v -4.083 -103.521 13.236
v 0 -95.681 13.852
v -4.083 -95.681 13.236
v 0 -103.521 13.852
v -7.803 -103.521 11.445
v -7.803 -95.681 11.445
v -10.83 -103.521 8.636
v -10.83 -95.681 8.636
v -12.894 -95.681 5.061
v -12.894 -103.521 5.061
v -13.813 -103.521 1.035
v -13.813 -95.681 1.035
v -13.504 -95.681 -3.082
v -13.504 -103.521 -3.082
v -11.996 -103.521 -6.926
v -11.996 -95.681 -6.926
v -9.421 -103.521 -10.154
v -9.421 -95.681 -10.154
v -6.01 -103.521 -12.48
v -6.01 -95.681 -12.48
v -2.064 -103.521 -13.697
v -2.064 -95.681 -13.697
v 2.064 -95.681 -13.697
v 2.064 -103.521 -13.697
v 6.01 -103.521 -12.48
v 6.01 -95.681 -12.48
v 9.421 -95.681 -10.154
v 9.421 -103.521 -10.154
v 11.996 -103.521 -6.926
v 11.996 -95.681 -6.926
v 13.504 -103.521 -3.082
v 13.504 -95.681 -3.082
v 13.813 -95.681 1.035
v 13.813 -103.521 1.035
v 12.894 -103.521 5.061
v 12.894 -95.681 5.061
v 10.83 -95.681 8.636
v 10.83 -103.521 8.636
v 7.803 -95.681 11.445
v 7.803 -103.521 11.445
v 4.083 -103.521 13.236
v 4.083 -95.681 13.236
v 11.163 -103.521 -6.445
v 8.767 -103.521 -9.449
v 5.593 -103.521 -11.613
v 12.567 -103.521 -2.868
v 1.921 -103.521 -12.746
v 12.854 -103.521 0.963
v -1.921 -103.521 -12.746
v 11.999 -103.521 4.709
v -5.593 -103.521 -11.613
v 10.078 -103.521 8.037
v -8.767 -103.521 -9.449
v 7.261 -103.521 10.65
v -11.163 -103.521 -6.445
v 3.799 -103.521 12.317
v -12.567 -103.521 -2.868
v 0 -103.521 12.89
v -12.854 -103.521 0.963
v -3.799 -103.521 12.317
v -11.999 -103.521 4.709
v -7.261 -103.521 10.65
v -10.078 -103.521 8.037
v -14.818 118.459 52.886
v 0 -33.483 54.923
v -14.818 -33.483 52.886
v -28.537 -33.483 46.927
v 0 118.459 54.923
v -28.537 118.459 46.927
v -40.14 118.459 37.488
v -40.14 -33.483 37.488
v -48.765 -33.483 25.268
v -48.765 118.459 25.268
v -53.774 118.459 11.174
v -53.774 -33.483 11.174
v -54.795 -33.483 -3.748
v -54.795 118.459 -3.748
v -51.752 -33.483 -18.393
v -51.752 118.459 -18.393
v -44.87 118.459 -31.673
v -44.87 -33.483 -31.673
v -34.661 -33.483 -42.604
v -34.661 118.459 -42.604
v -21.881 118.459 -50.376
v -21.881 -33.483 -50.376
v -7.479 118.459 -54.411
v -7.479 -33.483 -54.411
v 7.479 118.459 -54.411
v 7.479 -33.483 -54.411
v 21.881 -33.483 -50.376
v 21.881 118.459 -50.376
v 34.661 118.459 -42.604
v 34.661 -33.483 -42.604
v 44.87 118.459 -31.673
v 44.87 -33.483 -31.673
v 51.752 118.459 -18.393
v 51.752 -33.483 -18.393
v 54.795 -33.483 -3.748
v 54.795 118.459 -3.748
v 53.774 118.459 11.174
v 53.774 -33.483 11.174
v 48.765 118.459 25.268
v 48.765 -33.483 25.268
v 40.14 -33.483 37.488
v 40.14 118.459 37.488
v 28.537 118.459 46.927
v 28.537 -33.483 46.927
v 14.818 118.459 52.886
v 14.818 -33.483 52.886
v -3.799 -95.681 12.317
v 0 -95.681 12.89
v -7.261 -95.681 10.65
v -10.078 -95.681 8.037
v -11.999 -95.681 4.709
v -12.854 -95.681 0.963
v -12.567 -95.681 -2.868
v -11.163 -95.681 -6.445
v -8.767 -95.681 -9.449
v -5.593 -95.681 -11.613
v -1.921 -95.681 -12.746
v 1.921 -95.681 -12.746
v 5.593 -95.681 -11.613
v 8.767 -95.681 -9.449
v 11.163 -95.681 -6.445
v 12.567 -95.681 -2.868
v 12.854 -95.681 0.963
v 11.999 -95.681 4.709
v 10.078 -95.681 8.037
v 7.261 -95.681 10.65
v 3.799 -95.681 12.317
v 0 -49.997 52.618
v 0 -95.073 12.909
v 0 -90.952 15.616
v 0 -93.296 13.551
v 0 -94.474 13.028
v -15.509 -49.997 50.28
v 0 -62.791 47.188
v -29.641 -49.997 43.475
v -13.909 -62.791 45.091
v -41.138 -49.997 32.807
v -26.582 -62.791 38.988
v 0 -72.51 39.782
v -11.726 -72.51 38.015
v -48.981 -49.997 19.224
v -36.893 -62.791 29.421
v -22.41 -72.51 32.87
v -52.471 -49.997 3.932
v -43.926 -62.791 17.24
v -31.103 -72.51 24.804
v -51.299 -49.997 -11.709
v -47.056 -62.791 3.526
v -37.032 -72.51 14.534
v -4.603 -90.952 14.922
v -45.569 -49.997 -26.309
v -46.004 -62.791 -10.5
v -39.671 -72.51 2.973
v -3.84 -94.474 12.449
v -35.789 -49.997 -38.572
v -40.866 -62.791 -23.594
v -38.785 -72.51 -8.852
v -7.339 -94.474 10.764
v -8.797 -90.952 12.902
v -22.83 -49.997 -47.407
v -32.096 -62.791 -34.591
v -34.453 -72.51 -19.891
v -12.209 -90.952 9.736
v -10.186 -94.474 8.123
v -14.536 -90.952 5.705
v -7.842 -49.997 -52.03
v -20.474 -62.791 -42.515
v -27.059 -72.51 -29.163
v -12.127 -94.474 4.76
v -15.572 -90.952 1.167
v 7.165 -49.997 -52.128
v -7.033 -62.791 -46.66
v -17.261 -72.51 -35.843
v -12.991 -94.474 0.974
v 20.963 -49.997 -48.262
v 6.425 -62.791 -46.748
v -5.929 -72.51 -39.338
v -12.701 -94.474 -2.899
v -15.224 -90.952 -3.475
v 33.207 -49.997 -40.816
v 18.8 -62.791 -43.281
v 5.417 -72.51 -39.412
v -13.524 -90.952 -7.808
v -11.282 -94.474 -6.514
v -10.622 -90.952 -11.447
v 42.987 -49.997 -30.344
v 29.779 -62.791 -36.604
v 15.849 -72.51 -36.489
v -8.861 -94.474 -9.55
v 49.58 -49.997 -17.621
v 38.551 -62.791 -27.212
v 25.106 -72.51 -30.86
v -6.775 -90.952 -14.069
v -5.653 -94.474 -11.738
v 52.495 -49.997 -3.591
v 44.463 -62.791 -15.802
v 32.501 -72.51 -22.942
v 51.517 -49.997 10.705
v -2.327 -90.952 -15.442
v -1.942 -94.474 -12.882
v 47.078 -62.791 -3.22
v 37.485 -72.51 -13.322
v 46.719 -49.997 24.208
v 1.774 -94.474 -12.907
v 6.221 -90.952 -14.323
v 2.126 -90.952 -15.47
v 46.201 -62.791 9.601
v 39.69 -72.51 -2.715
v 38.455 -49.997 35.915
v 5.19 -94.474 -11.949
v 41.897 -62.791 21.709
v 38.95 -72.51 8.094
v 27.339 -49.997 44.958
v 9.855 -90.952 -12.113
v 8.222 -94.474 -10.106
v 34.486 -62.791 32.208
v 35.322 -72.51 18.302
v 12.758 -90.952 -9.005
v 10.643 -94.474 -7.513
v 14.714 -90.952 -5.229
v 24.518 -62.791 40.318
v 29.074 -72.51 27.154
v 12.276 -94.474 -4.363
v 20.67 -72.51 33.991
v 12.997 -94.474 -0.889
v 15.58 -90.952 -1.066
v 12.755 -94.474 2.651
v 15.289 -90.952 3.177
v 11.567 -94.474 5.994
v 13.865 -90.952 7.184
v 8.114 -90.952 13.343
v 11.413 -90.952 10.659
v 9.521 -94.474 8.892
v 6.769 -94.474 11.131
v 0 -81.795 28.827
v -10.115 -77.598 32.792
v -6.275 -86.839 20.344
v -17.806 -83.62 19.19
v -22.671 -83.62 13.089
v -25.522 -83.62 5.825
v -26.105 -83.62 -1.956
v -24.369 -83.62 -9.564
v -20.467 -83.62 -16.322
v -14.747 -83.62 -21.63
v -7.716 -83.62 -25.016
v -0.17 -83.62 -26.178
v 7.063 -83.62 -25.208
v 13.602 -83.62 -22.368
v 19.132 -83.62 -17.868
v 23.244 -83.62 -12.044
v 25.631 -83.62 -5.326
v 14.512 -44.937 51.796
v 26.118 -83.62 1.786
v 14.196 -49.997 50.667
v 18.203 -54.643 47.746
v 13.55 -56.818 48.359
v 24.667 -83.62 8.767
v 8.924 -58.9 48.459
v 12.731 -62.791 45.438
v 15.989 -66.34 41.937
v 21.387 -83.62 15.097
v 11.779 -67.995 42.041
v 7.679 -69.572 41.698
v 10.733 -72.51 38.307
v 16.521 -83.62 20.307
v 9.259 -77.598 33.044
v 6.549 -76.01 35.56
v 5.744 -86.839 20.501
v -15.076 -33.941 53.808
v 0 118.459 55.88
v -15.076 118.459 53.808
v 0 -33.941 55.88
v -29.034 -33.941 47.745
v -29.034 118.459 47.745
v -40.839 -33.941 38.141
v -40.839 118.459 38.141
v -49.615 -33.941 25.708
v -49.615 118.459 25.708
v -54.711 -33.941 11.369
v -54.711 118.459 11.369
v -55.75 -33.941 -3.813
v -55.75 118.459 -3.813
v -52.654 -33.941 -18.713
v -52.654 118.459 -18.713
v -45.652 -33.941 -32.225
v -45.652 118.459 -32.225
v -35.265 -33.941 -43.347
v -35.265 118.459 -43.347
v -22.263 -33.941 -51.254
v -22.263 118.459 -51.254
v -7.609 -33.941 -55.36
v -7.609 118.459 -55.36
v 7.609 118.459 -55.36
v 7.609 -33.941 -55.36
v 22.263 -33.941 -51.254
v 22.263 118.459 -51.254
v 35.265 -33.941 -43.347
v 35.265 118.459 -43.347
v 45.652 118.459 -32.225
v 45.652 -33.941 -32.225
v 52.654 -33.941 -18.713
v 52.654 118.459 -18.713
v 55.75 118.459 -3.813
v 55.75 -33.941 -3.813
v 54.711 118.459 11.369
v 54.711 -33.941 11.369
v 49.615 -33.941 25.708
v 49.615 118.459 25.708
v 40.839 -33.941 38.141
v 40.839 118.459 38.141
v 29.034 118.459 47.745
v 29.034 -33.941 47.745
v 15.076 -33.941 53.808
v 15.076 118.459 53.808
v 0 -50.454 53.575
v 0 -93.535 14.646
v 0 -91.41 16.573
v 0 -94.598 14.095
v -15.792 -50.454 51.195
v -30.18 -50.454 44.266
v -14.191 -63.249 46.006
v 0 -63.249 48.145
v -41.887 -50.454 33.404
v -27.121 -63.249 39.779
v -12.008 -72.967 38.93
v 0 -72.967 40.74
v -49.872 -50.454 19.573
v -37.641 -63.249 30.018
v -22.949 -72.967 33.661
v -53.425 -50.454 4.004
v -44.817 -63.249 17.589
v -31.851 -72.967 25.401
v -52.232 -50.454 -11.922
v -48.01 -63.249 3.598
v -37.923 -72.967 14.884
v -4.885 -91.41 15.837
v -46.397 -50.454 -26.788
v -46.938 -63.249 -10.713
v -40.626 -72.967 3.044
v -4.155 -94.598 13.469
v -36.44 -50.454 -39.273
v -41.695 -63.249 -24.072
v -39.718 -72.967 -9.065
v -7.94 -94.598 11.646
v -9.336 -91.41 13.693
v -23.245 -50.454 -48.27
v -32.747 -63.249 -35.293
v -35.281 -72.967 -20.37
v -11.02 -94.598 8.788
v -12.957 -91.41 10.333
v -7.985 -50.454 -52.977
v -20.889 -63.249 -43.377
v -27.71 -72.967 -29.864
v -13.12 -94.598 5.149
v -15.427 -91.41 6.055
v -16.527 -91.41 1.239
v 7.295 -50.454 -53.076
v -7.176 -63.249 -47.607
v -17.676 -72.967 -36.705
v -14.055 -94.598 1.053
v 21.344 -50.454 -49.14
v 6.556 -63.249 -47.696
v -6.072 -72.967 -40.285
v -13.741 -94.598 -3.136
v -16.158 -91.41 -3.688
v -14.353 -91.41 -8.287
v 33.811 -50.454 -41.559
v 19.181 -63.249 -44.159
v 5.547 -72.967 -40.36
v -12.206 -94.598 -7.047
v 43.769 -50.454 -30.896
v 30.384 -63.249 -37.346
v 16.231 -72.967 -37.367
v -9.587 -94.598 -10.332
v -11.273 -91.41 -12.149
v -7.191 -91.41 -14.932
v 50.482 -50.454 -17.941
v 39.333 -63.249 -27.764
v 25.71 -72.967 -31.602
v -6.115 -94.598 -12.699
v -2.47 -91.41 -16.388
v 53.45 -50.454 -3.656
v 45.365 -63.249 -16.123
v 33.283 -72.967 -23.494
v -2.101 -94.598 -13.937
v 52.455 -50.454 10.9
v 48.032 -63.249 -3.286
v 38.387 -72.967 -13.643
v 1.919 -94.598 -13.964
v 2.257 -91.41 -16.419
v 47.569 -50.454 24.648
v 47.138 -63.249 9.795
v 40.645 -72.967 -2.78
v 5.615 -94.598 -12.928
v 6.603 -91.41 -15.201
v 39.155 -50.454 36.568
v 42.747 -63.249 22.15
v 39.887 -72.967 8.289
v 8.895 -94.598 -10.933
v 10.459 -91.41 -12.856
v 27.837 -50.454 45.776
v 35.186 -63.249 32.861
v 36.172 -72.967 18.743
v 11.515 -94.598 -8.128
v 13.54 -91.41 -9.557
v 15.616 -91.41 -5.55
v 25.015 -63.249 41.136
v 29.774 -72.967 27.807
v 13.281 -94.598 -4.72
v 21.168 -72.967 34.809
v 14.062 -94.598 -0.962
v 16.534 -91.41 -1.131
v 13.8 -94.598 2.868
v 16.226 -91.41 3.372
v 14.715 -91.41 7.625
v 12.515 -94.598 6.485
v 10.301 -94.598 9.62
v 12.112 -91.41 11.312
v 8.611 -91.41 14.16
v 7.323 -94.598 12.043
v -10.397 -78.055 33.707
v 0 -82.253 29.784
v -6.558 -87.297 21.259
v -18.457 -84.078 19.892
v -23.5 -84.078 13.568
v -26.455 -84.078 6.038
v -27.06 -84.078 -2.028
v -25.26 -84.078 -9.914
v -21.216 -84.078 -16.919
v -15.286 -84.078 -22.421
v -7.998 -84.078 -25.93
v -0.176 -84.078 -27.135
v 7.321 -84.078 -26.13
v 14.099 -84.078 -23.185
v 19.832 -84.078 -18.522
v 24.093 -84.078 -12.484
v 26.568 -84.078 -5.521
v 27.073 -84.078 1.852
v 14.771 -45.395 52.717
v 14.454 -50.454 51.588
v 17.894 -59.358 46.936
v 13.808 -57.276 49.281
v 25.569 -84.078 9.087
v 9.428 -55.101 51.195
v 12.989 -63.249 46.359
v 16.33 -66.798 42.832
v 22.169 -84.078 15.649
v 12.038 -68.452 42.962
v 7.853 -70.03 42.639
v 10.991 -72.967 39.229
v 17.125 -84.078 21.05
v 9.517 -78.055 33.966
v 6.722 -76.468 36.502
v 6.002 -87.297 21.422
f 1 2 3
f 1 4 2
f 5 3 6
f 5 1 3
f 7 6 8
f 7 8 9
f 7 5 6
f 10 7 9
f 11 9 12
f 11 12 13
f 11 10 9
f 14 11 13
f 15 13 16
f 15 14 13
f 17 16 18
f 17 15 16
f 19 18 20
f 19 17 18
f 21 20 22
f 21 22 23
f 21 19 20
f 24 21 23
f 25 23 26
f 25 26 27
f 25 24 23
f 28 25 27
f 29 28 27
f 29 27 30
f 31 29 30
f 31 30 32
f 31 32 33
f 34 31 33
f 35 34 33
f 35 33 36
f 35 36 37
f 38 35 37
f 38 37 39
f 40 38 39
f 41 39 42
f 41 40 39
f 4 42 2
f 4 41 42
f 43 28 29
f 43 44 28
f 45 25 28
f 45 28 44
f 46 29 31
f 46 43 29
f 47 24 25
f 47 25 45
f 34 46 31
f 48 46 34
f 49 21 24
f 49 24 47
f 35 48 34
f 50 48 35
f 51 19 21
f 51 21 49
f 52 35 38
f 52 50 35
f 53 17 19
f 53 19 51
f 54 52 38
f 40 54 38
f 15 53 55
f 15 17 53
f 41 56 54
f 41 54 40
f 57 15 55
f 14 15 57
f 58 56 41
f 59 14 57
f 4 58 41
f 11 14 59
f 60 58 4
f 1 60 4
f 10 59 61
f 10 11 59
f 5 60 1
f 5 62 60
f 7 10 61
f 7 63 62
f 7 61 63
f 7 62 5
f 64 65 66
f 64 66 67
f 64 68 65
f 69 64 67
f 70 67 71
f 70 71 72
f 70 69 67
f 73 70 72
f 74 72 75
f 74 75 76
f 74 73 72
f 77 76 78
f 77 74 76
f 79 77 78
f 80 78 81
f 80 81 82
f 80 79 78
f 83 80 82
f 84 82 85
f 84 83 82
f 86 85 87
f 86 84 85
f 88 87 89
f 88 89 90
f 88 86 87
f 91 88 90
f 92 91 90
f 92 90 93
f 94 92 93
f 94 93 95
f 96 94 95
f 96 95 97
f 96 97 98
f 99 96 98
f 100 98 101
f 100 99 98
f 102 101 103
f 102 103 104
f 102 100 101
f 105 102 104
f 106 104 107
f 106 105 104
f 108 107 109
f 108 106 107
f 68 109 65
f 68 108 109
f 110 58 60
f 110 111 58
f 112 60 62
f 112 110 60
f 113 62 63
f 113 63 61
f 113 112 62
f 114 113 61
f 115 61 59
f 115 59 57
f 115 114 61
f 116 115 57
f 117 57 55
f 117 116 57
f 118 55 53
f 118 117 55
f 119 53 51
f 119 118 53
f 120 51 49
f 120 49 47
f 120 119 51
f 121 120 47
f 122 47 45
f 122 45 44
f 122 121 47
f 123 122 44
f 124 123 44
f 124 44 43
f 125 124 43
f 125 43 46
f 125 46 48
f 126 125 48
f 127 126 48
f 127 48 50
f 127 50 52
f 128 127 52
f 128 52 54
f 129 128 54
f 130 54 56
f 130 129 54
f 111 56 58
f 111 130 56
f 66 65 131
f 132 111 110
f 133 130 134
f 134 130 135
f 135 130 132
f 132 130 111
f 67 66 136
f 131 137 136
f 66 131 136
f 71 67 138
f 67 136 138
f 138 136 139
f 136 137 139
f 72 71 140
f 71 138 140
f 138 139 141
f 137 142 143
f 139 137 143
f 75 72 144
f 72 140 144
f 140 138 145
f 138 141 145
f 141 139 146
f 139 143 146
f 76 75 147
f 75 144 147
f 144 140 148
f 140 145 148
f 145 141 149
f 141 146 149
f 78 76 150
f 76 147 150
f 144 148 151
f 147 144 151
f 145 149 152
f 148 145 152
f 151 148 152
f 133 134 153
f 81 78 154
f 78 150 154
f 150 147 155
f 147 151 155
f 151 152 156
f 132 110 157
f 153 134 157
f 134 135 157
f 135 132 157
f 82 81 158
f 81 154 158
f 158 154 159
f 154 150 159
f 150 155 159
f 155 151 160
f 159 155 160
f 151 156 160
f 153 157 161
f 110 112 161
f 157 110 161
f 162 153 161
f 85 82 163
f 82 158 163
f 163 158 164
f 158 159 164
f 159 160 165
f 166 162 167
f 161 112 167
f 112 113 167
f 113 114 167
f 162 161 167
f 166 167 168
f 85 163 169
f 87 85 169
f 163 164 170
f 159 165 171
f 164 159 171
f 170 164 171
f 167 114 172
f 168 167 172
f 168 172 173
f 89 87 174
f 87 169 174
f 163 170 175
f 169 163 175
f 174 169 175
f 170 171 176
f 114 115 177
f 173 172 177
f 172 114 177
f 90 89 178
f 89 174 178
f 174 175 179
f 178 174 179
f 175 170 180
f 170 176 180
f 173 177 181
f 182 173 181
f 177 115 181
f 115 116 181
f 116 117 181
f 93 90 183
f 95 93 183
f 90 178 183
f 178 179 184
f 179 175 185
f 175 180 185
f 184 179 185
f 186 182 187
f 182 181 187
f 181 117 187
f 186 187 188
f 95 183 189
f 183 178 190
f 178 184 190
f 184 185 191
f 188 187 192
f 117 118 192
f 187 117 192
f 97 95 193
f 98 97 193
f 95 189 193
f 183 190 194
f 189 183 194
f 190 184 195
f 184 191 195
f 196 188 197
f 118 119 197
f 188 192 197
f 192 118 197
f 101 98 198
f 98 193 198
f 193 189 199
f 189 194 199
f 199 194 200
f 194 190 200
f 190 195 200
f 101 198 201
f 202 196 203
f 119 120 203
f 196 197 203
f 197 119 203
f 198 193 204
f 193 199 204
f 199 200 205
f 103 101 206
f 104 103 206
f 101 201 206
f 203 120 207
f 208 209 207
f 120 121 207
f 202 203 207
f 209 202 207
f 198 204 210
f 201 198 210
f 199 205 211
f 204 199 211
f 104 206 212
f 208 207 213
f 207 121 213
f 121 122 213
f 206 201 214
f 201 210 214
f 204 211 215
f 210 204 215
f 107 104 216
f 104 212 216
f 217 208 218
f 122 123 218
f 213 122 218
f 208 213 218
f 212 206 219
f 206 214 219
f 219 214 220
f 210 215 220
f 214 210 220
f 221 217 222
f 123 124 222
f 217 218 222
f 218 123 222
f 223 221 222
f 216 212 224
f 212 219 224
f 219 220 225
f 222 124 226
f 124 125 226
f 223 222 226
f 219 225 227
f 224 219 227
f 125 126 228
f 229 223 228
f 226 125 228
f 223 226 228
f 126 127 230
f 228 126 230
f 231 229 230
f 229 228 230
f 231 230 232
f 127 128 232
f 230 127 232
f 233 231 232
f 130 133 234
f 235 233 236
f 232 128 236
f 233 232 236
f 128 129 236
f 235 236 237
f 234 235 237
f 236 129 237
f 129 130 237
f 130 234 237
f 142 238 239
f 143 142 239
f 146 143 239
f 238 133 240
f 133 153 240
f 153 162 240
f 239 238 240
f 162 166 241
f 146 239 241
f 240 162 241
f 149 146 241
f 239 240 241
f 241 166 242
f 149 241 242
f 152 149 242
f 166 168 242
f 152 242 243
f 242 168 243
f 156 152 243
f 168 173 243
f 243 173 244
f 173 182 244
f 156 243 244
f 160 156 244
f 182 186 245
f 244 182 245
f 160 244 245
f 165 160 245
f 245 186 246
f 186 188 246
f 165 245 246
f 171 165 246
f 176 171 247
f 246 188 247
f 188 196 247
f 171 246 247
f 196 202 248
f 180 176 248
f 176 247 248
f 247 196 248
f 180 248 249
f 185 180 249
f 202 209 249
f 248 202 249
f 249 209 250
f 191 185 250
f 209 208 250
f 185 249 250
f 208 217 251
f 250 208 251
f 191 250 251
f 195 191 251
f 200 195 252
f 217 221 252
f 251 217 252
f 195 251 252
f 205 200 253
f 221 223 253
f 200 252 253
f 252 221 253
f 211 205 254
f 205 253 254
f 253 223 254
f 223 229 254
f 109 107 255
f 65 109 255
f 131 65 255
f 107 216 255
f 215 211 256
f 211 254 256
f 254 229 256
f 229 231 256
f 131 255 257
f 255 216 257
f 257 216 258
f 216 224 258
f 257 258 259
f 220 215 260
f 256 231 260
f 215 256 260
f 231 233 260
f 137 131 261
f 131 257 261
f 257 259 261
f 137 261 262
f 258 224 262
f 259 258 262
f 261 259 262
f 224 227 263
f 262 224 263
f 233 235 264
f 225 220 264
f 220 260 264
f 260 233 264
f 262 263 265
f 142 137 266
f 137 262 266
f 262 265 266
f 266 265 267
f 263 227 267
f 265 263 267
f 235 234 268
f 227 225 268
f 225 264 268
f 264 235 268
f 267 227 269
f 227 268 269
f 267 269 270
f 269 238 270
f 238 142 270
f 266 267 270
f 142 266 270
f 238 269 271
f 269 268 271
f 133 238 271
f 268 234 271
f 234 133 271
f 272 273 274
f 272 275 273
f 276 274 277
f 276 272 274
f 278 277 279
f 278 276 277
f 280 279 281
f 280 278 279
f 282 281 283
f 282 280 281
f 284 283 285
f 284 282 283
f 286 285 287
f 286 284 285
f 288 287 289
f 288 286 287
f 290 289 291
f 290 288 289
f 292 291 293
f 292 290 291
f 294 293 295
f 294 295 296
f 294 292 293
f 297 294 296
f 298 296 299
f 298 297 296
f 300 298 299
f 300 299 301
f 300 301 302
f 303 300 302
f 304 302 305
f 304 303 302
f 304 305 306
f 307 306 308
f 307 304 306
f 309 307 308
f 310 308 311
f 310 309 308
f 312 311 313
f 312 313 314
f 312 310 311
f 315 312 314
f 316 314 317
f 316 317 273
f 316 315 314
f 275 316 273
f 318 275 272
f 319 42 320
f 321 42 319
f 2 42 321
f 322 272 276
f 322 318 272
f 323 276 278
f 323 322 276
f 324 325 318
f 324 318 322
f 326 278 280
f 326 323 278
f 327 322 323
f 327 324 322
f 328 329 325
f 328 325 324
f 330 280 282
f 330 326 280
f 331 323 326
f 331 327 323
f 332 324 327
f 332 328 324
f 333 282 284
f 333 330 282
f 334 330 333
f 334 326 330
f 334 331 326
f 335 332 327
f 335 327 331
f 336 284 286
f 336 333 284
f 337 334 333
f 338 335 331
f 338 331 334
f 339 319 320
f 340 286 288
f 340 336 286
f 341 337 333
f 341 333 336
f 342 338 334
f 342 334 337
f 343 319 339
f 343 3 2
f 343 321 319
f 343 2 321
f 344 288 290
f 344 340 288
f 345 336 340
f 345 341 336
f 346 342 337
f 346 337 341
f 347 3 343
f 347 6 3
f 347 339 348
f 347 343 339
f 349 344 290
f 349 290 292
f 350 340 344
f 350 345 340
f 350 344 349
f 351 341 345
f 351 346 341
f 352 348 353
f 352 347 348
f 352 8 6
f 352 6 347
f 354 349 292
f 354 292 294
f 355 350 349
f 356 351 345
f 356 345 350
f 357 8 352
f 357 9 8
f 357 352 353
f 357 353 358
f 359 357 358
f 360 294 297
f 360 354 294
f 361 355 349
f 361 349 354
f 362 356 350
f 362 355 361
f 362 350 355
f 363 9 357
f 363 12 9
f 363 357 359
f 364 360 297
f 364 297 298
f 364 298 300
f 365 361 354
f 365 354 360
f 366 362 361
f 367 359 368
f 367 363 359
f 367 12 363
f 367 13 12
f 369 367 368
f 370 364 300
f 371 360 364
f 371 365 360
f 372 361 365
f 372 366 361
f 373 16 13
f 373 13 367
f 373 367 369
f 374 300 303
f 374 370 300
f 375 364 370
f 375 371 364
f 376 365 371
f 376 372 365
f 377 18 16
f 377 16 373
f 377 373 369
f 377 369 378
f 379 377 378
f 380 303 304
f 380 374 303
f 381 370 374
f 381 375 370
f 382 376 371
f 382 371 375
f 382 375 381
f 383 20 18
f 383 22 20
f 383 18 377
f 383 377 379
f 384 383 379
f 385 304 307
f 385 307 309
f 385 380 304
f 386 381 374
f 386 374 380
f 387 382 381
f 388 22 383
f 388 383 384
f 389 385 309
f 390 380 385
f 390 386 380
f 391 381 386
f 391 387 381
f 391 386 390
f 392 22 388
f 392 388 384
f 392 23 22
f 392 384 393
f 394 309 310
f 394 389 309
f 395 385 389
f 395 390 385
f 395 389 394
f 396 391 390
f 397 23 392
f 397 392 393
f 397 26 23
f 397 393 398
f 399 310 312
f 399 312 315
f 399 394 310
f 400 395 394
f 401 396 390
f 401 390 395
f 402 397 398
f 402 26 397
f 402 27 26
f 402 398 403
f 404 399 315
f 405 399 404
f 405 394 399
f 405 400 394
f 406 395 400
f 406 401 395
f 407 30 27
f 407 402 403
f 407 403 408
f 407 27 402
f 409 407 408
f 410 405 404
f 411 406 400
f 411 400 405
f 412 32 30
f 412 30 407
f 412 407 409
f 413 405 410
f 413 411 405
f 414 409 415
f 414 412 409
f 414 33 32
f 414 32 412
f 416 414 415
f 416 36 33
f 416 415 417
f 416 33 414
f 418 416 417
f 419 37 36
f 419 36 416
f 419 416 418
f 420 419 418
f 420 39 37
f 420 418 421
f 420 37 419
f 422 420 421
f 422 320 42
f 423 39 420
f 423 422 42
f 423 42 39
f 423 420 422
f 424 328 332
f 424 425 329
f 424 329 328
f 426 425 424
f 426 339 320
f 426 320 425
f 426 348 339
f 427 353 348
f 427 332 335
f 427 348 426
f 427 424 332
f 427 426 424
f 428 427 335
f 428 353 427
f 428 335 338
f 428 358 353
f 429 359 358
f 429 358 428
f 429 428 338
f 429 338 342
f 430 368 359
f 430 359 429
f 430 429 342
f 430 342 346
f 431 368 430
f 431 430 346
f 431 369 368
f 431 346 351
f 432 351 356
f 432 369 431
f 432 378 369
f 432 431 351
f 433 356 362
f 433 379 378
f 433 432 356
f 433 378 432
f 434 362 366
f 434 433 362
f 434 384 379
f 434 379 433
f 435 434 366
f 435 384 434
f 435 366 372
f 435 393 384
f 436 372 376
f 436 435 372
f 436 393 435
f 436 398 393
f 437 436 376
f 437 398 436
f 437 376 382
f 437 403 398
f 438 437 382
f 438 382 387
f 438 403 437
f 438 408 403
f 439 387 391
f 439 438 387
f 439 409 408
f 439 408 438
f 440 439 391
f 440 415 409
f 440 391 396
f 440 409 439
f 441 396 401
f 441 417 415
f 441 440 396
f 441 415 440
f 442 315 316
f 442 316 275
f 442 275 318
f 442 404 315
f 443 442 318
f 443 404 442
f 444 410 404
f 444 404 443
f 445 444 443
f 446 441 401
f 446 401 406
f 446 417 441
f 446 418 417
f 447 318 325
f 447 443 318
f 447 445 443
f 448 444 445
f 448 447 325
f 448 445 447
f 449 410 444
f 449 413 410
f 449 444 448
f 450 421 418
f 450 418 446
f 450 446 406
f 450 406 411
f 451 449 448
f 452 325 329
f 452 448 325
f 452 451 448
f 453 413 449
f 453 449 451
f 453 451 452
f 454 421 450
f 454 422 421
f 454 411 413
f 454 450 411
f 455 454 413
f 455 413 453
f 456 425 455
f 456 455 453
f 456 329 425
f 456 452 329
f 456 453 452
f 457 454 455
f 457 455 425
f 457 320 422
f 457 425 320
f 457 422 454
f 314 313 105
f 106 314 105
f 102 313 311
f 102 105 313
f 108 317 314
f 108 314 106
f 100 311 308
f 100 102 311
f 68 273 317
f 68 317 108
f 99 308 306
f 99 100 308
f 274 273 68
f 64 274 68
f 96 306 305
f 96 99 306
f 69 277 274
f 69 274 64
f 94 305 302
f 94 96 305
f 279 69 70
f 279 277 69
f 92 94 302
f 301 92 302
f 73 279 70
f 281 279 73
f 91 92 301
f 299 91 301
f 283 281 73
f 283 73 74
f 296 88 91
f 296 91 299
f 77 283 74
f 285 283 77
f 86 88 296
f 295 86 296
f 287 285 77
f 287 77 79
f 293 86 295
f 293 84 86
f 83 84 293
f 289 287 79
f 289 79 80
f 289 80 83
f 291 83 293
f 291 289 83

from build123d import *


with BuildPart() as part:
    # Sketch1 → Revolve2 (revolve)
    with BuildSketch(Plane.XY, mode=Mode.PRIVATE) as revolve2_sk:
        with BuildLine():
            Line((-55.88, 118.459427374), (-55.88, -33.940572626))
            add(Edge.make_bspline(
                [(-55.88, -33.940572626), (-54.990575769, -80.080925815), (-14.574030728, -85.897657427), (-13.851510687, -95.680738649)],
                knots=[0, 0, 0, 0, 0.984737572, 0.984737572, 0.984737572, 0.984737572], degree=3))
            Line((-13.851510687, -95.680738649), (-13.851510687, -103.52108655))
            Line((-13.851510687, -103.52108655), (-12.889681114, -103.52108655))
            Line((-12.889681114, -103.52108655), (-12.889681114, -95.680738649))
            add(Edge.make_bspline(
                [(-54.922864743, -33.482666024), (-54.019655344, -80.338147614), (-12.354569903, -85.610371161), (-12.889681114, -95.680738649)],
                knots=[0, 0, 0, 0, 1, 1, 1, 1], degree=3))
            Line((-54.922864743, -33.482666024), (-54.922864743, 118.459427374))
            Line((-54.922864743, 118.459427374), (-55.88, 118.459427374))
        make_face()
    revolve(revolve2_sk.sketch.rotate(Axis((0, 76.879343575, 0), (0, -1, 0)), 270), axis=Axis((0, 76.879343575, 0), (0, -1, 0)))


solid = part.part
